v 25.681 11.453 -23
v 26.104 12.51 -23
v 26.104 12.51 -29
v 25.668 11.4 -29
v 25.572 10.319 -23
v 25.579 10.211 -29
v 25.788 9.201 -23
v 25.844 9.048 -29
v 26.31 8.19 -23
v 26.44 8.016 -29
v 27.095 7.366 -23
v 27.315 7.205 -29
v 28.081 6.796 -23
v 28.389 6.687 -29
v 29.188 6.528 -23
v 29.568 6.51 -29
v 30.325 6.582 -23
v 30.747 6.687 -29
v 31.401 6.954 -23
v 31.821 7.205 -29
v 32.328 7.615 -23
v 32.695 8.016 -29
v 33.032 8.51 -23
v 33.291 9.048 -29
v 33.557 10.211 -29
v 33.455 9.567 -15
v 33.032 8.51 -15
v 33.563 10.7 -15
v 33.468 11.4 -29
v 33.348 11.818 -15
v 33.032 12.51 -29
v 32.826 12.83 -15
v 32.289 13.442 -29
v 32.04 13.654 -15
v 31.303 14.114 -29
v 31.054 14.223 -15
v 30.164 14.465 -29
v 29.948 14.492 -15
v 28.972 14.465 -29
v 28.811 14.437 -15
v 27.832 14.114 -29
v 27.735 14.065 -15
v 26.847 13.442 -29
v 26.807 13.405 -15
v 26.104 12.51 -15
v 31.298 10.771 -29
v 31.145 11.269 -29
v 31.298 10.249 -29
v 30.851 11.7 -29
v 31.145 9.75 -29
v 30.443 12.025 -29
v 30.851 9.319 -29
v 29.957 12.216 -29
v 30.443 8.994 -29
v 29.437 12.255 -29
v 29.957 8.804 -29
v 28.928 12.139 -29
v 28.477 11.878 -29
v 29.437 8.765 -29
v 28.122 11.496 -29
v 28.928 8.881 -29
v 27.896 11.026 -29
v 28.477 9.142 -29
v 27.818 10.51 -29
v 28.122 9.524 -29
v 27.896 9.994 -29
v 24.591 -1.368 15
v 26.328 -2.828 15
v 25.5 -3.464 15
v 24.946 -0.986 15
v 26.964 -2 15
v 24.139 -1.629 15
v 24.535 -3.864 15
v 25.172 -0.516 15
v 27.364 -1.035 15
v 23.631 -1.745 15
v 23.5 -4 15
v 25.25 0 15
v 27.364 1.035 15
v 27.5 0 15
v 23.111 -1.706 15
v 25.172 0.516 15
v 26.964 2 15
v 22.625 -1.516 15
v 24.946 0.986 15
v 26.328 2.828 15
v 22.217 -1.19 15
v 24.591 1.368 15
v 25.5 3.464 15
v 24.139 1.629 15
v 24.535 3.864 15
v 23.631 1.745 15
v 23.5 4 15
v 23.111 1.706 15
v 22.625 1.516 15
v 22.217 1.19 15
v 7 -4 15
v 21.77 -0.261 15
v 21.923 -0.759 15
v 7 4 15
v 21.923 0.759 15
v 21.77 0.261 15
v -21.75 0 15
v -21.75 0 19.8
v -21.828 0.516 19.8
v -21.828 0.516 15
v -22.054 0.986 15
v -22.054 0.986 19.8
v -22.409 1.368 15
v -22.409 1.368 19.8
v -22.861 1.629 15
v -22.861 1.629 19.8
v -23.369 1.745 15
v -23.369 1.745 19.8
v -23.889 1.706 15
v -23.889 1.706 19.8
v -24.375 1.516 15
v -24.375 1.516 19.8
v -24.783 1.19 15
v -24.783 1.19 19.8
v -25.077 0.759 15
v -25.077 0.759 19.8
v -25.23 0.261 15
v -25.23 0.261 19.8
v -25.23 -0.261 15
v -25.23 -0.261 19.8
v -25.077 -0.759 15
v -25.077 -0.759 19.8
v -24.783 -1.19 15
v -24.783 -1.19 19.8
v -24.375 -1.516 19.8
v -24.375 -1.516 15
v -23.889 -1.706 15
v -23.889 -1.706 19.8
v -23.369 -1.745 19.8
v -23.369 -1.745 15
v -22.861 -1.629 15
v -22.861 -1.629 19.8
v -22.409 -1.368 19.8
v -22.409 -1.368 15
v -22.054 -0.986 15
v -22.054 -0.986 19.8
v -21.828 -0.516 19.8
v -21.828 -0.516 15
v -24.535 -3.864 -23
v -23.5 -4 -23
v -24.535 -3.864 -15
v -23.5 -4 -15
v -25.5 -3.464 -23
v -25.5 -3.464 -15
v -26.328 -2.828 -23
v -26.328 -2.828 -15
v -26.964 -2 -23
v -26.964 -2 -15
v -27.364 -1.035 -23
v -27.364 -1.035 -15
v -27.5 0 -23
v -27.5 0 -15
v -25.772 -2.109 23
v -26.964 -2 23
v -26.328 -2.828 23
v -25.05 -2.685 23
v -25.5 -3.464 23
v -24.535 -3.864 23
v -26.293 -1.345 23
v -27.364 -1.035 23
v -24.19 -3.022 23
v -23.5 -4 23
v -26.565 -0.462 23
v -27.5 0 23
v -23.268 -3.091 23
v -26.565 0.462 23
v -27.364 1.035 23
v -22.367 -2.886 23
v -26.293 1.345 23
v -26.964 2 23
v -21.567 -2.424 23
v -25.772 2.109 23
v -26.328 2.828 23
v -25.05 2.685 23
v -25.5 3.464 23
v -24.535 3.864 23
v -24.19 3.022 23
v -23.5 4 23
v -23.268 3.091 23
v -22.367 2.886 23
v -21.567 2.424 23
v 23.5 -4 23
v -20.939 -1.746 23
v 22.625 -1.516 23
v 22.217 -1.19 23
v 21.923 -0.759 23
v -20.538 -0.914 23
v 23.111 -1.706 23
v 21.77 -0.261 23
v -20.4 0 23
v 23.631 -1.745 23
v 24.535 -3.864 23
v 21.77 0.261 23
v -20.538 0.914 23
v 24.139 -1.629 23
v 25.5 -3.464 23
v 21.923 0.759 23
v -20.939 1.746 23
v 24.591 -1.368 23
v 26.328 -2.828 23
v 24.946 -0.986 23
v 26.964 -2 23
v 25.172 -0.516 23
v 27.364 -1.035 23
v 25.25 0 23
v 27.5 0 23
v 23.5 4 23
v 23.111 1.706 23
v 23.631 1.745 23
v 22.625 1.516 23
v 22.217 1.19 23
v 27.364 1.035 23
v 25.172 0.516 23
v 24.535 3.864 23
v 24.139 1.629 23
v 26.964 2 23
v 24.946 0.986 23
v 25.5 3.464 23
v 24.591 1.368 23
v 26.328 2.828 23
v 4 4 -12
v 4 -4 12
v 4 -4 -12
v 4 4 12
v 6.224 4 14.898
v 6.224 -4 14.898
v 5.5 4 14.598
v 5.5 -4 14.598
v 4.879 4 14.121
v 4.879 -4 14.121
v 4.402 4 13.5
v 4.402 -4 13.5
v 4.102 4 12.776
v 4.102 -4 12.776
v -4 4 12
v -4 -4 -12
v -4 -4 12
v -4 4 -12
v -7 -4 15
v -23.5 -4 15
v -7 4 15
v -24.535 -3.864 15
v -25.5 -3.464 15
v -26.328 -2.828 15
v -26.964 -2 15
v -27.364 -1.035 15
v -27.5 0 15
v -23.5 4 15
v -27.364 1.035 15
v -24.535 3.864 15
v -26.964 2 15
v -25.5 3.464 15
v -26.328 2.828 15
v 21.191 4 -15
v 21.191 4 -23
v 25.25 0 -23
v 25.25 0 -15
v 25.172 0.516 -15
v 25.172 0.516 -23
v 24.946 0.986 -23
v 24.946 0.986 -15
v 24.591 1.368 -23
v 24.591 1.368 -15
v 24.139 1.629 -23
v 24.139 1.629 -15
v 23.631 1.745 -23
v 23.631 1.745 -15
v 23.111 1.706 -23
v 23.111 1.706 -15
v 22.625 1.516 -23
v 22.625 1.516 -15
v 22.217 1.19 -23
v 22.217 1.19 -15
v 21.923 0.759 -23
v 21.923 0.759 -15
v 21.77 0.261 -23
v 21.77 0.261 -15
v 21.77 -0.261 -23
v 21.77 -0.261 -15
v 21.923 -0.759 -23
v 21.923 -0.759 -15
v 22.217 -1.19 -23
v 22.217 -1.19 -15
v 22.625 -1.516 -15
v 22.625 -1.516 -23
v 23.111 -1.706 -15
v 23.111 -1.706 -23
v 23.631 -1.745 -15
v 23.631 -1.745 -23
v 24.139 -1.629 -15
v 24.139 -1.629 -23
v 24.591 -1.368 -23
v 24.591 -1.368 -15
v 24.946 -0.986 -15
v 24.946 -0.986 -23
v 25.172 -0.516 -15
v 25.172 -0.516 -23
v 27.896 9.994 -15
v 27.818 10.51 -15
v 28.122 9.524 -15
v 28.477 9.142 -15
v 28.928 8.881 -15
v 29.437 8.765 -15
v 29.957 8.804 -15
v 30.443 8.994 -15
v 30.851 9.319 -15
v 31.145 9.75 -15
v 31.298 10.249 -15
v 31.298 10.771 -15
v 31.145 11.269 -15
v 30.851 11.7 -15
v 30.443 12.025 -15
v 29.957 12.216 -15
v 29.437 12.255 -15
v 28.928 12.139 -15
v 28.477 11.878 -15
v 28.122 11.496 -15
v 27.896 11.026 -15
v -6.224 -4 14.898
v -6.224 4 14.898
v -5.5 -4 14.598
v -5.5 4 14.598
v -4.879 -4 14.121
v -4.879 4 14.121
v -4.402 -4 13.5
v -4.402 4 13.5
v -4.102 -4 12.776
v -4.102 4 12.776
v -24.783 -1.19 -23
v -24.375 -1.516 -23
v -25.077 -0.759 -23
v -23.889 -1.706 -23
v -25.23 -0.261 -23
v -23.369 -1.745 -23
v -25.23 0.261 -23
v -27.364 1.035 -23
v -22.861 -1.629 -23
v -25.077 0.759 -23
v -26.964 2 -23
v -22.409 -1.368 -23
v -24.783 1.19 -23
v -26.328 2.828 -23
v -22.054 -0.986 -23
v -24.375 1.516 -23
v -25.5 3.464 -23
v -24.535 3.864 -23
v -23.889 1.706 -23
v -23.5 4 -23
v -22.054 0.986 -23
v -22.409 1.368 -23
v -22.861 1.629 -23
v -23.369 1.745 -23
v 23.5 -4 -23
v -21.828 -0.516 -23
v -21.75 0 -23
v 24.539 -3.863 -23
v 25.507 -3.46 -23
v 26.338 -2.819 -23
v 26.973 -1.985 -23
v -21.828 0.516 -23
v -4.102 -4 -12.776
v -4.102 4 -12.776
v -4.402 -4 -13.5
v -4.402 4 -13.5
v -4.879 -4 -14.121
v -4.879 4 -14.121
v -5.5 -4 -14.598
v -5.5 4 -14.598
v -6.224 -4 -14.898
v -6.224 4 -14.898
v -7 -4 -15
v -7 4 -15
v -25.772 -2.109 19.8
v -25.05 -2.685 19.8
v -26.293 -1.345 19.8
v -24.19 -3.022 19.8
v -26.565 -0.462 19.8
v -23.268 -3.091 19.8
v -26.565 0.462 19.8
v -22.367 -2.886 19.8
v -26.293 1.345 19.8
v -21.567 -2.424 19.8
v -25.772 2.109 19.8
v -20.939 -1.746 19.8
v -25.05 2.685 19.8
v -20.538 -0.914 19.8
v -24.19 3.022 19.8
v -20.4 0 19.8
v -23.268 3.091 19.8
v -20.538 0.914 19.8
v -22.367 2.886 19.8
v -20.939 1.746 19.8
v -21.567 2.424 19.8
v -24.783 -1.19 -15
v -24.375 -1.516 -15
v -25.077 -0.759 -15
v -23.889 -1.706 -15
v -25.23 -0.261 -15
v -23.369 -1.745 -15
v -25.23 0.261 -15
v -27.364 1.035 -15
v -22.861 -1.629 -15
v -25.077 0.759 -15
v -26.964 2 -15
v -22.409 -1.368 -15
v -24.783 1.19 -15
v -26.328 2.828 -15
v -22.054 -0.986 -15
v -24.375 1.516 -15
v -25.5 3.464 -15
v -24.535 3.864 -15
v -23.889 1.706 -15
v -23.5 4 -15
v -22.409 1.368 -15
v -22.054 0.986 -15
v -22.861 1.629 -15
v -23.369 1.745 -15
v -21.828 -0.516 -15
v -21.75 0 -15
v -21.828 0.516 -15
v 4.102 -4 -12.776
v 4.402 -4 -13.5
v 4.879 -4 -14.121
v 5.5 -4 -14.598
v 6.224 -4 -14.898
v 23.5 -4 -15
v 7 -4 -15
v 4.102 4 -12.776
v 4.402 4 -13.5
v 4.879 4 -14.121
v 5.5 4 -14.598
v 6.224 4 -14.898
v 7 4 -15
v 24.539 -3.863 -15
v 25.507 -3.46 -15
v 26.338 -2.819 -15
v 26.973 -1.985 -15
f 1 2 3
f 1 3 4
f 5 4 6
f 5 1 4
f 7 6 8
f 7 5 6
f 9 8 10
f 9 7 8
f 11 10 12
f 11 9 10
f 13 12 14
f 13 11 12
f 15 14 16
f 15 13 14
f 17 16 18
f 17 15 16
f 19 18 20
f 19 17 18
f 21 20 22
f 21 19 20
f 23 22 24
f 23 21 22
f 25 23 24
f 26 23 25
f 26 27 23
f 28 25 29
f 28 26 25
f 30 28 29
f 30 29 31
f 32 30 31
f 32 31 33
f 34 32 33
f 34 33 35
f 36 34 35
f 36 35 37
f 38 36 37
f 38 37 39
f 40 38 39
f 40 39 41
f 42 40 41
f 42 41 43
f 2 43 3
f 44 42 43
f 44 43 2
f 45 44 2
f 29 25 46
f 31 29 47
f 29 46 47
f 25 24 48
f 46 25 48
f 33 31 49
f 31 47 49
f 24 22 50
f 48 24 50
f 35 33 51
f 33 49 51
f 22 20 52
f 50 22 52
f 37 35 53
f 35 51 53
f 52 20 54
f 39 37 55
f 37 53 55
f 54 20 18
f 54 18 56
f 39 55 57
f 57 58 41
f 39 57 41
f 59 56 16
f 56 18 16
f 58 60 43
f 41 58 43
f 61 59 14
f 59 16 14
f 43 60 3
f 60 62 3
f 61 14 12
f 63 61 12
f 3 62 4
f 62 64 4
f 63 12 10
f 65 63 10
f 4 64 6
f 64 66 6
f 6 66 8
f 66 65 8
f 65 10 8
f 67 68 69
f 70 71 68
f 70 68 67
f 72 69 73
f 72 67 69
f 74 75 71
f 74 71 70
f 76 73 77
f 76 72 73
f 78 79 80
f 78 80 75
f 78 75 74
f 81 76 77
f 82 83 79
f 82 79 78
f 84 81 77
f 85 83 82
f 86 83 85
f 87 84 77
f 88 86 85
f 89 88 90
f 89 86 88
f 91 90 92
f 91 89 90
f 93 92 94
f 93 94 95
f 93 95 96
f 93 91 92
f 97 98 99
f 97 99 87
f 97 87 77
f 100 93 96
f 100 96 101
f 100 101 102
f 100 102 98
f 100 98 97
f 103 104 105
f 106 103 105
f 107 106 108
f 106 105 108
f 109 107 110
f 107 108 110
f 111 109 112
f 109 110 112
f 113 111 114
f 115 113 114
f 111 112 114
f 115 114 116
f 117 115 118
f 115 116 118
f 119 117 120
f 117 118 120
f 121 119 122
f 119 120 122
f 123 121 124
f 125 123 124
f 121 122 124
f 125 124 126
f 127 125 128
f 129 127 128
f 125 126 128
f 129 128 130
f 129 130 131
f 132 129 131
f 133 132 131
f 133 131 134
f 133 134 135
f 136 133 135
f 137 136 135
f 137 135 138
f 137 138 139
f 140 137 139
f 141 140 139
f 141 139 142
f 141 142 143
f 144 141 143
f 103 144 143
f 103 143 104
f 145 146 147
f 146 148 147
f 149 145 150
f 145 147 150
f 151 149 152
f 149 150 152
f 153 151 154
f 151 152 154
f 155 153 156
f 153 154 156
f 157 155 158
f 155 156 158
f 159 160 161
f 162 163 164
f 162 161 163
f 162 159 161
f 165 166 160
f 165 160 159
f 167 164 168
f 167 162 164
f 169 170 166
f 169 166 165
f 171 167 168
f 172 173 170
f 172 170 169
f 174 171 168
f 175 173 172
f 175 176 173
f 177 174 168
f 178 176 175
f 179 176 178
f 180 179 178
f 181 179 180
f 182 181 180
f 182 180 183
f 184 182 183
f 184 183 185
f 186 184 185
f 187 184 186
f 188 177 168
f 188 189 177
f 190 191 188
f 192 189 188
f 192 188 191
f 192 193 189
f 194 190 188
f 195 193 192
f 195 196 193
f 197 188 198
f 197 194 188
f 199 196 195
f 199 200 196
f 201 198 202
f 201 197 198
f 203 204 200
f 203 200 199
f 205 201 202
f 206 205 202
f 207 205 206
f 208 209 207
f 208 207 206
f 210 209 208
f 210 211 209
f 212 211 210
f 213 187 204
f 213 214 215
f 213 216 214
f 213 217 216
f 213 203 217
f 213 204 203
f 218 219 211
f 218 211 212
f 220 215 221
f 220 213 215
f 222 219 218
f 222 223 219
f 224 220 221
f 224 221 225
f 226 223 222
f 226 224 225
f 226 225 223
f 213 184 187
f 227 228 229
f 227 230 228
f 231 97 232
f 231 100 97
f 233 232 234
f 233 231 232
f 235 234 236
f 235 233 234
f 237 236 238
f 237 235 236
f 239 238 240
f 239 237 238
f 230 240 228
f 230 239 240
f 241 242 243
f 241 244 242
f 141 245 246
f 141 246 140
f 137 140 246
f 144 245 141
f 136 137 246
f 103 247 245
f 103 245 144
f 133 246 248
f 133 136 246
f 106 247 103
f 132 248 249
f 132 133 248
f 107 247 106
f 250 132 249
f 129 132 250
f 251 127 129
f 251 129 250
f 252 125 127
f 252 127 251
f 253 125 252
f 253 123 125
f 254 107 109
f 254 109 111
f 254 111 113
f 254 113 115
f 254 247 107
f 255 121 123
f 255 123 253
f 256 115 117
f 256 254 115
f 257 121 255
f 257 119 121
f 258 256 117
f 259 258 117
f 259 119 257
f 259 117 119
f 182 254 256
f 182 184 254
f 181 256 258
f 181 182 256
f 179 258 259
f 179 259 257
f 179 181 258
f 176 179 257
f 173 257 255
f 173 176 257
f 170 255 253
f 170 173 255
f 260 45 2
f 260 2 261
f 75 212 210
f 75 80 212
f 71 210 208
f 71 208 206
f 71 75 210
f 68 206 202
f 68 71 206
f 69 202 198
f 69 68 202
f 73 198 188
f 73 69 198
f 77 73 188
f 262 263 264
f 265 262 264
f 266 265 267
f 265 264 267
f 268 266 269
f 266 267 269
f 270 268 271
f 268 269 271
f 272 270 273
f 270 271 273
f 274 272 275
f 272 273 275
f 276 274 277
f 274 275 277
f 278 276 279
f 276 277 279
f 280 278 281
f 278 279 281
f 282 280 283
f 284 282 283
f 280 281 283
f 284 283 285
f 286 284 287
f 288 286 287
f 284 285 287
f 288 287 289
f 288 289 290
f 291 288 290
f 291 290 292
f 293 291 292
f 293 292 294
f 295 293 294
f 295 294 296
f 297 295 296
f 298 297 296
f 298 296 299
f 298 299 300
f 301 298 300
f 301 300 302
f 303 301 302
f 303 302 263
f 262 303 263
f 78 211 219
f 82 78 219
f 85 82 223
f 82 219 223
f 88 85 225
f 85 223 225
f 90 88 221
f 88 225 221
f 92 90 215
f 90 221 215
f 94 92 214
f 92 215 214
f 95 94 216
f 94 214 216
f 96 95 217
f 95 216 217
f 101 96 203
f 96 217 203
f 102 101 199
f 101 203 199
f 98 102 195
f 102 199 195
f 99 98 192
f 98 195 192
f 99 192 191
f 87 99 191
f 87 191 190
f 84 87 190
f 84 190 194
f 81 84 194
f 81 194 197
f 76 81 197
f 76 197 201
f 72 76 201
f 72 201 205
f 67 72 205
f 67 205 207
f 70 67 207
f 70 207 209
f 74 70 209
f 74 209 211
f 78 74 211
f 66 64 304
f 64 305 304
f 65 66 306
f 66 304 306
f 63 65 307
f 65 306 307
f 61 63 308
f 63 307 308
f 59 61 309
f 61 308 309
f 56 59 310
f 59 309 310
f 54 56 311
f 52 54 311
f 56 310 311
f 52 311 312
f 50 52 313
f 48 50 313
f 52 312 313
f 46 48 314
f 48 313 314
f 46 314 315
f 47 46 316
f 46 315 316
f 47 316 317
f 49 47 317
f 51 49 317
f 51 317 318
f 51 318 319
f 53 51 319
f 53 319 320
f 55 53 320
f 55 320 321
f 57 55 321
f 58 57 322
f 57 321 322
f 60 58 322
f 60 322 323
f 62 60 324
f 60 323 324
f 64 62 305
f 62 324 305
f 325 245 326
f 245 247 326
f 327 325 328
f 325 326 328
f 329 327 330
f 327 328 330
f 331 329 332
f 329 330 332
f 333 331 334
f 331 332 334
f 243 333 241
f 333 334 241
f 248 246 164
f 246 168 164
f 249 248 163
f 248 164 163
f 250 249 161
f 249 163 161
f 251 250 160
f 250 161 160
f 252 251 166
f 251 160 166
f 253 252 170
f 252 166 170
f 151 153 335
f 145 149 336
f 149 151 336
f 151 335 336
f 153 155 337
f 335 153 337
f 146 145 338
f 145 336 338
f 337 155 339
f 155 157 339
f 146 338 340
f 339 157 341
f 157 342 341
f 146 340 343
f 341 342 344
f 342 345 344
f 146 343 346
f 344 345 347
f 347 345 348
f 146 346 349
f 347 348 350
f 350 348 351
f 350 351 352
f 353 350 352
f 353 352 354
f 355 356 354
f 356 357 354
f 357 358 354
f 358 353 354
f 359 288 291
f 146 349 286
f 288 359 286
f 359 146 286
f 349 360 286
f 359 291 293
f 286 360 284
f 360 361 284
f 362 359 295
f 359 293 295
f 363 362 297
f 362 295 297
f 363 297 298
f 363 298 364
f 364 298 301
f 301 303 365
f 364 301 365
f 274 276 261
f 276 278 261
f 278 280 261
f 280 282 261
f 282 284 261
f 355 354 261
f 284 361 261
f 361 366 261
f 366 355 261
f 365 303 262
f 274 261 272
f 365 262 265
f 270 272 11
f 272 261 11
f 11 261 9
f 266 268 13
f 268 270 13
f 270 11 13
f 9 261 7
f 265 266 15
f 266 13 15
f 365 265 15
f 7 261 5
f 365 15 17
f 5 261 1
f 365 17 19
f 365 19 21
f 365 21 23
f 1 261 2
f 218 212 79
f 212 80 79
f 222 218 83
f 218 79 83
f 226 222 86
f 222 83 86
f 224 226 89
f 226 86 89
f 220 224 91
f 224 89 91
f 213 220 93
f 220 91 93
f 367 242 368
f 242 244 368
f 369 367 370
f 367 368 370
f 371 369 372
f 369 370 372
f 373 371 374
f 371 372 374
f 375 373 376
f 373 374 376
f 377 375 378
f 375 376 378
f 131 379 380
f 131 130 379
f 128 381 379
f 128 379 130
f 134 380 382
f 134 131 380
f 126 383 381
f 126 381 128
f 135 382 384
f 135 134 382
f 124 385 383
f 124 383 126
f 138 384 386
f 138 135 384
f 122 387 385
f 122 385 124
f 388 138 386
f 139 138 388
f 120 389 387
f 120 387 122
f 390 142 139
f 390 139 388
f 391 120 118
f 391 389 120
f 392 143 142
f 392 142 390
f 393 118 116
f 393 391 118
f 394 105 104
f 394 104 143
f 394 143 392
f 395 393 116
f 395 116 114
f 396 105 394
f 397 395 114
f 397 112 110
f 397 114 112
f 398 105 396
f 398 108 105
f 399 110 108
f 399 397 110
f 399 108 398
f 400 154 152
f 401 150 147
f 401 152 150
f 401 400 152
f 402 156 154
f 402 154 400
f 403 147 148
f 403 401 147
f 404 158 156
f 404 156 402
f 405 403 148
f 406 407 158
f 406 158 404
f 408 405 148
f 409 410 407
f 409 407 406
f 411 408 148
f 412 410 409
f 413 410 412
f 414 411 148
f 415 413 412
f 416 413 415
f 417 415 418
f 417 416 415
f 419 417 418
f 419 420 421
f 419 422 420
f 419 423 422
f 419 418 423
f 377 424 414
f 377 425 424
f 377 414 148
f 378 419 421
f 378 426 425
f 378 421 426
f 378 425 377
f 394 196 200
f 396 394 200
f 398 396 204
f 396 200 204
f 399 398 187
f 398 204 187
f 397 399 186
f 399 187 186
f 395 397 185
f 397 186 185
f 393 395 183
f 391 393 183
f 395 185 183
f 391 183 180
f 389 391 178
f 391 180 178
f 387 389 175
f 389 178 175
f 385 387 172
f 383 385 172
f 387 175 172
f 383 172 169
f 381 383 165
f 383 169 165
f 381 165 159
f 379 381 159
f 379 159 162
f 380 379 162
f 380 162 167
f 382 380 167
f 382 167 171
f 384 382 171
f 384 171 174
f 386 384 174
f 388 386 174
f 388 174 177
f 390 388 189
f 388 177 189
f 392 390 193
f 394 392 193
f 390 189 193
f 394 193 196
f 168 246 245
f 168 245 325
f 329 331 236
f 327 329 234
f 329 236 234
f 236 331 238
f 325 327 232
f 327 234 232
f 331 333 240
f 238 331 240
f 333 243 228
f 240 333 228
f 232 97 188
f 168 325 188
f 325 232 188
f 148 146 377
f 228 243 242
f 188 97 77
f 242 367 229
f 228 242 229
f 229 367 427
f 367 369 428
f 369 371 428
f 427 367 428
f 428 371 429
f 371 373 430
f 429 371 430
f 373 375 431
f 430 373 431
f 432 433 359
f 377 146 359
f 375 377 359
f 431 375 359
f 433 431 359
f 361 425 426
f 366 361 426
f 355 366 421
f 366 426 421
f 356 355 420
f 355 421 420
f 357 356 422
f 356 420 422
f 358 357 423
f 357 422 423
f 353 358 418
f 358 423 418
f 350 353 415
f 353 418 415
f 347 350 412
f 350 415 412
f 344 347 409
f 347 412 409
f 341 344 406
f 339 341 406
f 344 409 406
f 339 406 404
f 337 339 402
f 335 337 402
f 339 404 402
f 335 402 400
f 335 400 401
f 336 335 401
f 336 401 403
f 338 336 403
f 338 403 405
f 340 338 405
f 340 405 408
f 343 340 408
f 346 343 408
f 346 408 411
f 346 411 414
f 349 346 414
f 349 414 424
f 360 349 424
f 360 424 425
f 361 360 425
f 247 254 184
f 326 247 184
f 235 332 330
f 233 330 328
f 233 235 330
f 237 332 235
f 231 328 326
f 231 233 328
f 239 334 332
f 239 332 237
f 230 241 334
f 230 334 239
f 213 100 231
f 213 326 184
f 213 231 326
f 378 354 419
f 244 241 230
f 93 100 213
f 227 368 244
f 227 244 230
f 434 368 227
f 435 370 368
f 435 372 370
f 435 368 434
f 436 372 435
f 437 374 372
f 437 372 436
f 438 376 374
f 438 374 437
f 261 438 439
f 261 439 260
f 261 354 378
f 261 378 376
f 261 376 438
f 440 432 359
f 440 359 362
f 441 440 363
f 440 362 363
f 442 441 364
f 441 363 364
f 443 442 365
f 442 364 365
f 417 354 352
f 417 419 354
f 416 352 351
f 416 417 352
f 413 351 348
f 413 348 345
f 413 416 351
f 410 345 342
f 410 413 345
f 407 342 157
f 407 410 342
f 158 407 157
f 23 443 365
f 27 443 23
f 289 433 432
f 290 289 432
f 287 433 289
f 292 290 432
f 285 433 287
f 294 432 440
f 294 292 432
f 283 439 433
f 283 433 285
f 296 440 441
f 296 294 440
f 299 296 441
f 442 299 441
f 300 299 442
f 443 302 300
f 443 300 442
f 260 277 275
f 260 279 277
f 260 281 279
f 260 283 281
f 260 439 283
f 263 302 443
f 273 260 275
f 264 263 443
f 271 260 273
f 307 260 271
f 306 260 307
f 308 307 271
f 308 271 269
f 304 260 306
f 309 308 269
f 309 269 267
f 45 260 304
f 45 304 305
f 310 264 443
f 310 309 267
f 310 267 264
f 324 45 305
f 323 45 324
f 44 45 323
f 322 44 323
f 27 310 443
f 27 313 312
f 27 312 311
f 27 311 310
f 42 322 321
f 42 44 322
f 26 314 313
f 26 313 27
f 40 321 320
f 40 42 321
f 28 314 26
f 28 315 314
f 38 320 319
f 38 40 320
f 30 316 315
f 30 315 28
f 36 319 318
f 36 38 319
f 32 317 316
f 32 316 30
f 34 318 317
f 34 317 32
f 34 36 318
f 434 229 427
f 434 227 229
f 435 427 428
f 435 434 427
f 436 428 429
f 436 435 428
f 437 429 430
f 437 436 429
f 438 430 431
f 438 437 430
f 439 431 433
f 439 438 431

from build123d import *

# Parameters (mm, degrees)
SALIENTE_EXTRUIR1_DEPTH = 4
CROQUIS3_R              = 1.75
CORTAR_EXTRUIR1_DEPTH   = 54.742441329
REDONDEO8_R             = 4
REDONDEO9_R             = 3
SALIENTE_EXTRUIR3_START = -8
CROQUIS5_R              = 1.75
SALIENTE_EXTRUIR3_DEPTH = 8
CROQUIS4_R              = 4
CROQUIS4_R_2            = 1.75
SALIENTE_EXTRUIR2_DEPTH = 6
CROQUIS6_R              = 3.1
CORTAR_EXTRUIR2_DEPTH   = 3.2


with BuildPart() as part:
    # Croquis2 → Saliente-Extruir1 (new, symmetric)
    with BuildSketch(Plane(origin=(0, 0, 0), x_dir=(1, 0, 0), z_dir=(0, 1, 0))):
        Polygon((27.5, -23), (27.5, -15), (4, -15), (4, 15), (27.5, 15), (27.5, 23), (-27.5, 23), (-27.5, 15), (-4, 15), (-4, -15), (-27.5, -15), (-27.5, -23), align=None)
    extrude(amount=SALIENTE_EXTRUIR1_DEPTH, both=True)

    # Croquis3 → Cortar-Extruir1 (cut, through all)
    with BuildSketch(Plane.XY.offset(23)):
        with Locations((23.5, 0)):
            Circle(CROQUIS3_R)
        with Locations((-23.5, 0)):
            Circle(CROQUIS3_R)
    extrude(amount=-CORTAR_EXTRUIR1_DEPTH, mode=Mode.SUBTRACT)

    # Redondeo8
    redondeo8_edges = [part.edges().sort_by_distance(p)[0] for p in [
        (27.5, -4, -19),
        (27.5, 4, -19),
        (27.5, -4, 19),
        (27.5, 4, 19),
        (-27.5, -4, -19),
        (-27.5, 4, -19),
        (-27.5, -4, 19),
        (-27.5, 4, 19),
    ]]
    fillet(redondeo8_edges, radius=REDONDEO8_R - 0.0001)  # a hair under: the kernel refuses the full size

    # Redondeo9
    redondeo9_edges = [part.edges().sort_by_distance(p)[0] for p in [
        (4, 0, -15),
        (4, 0, 15),
        (-4, 0, 15),
        (-4, 0, -15),
    ]]
    fillet(redondeo9_edges, radius=REDONDEO9_R)

    # Croquis5 → Saliente-Extruir3 (add)
    with BuildSketch(Plane(origin=(0, 0, -23), x_dir=(-1, 0, 0), z_dir=(0, 0, -1)).offset(SALIENTE_EXTRUIR3_START)):
        with BuildLine():
            Line((-26.103713296, 12.509763717), (-20.035898385, 2))
            ThreePointArc((-20.035898385, 2), (-21.5, -3.464101615), (-26.964101615, -2))
            Line((-26.964101615, -2), (-33.031916526, 8.509763717))
            ThreePointArc((-33.031916526, 8.509763717), (-31.567814911, 13.973865332), (-26.103713296, 12.509763717))
        make_face()
        with Locations(Location((-23.5, 0, 0), (0, 0, 180))):
            Circle(CROQUIS5_R, mode=Mode.SUBTRACT)
        with Locations((-29.567814911, 10.509763717)):
            Circle(CROQUIS5_R, mode=Mode.SUBTRACT)
    extrude(amount=SALIENTE_EXTRUIR3_DEPTH)

    # Croquis4 → Saliente-Extruir2 (add)
    with BuildSketch(Plane.XY.offset(-23)):
        with Locations(Location((29.567814911, 10.509763717, 0), (0, 0, 150))):
            Circle(CROQUIS4_R)
        with Locations(Location((29.567814911, 10.509763717, 0), (0, 0, 180))):
            Circle(CROQUIS4_R_2, mode=Mode.SUBTRACT)
    extrude(amount=-SALIENTE_EXTRUIR2_DEPTH)

    # Croquis6 → Cortar-Extruir2 (cut)
    with BuildSketch(Plane.XY.offset(23)):
        with Locations((-23.5, 0)):
            Circle(CROQUIS6_R)
    extrude(amount=-CORTAR_EXTRUIR2_DEPTH, mode=Mode.SUBTRACT)


solid = part.part
